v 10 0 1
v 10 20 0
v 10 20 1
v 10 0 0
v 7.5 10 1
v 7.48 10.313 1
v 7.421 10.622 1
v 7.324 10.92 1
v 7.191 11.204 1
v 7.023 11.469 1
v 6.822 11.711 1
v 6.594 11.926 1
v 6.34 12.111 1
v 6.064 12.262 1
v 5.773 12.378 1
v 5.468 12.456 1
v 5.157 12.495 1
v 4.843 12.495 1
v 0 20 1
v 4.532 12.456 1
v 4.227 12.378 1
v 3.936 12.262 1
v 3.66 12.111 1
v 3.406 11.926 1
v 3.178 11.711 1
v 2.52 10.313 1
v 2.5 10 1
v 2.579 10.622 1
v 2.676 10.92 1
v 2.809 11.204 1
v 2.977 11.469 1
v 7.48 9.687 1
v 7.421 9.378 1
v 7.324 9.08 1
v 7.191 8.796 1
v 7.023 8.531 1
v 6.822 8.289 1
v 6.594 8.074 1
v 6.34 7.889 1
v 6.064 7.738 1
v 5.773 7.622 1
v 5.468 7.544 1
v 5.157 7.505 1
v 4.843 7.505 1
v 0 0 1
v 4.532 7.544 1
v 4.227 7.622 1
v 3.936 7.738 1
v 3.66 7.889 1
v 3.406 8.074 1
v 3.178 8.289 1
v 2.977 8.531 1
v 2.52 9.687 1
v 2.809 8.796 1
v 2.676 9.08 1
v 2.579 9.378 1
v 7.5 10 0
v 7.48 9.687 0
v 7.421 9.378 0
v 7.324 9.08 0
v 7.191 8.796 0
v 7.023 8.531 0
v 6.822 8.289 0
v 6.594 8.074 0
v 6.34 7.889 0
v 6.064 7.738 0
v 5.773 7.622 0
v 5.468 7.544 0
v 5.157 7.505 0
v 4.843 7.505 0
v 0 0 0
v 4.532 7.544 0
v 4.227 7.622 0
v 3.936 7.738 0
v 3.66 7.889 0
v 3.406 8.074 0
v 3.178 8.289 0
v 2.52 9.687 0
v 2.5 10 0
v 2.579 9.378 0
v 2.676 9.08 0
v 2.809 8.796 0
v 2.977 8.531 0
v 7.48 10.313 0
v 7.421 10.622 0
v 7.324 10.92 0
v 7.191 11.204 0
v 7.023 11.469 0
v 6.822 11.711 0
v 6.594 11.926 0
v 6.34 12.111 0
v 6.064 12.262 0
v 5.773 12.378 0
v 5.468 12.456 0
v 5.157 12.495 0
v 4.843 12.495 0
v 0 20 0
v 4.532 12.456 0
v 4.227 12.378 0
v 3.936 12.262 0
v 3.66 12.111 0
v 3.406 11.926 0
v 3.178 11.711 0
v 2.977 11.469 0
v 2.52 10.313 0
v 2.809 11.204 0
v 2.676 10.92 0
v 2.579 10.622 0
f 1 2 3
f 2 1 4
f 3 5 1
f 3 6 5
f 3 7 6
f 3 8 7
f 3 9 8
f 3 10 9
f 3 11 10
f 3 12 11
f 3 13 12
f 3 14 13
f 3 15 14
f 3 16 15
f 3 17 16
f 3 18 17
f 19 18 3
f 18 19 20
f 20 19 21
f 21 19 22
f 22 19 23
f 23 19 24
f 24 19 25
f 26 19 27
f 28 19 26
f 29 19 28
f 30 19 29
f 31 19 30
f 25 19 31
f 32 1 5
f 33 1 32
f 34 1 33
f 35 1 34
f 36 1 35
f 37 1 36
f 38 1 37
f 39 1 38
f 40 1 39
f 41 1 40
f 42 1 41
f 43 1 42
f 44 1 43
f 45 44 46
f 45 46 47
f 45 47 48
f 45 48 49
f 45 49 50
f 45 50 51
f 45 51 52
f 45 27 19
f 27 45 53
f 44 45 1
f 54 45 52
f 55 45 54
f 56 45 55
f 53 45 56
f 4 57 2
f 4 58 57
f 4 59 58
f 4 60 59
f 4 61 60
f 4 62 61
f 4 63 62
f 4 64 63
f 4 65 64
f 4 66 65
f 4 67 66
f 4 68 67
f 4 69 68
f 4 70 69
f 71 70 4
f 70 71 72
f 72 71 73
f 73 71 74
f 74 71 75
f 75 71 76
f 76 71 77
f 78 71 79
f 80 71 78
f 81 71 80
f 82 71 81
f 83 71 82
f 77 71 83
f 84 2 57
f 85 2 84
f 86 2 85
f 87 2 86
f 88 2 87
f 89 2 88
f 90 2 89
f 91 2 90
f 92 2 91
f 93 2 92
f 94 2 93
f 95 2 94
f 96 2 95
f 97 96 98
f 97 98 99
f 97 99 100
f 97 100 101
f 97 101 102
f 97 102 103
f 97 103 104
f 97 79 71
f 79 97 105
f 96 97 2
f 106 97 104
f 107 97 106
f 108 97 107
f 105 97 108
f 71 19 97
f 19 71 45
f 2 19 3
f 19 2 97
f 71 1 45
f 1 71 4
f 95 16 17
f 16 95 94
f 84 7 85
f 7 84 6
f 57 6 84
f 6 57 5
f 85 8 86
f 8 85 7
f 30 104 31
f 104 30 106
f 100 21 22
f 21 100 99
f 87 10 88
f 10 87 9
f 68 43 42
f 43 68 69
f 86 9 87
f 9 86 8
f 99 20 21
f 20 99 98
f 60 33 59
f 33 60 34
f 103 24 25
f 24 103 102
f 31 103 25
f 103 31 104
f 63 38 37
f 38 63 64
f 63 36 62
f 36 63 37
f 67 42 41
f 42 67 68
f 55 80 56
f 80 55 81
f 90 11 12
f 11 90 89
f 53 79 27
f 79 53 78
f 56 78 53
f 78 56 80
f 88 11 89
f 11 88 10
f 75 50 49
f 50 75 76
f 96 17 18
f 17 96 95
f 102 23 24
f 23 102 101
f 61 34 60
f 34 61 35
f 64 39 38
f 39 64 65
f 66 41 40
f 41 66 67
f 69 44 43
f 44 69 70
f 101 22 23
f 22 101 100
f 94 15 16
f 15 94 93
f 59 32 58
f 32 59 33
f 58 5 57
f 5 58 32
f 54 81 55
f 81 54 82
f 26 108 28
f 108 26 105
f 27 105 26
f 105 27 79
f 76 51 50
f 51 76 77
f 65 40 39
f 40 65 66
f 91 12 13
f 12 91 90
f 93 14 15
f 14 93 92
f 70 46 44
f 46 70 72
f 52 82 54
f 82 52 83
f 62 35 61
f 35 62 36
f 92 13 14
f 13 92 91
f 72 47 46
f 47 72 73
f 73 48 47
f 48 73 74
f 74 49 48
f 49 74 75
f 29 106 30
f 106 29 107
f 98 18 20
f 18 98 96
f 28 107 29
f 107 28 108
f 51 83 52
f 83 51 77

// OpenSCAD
$fn = 50;

difference() {
	cube([10, 20, 1]);
	translate([5, 10, -0.01]) {
		cylinder(r = 2.5, h = 2);
	}
}
